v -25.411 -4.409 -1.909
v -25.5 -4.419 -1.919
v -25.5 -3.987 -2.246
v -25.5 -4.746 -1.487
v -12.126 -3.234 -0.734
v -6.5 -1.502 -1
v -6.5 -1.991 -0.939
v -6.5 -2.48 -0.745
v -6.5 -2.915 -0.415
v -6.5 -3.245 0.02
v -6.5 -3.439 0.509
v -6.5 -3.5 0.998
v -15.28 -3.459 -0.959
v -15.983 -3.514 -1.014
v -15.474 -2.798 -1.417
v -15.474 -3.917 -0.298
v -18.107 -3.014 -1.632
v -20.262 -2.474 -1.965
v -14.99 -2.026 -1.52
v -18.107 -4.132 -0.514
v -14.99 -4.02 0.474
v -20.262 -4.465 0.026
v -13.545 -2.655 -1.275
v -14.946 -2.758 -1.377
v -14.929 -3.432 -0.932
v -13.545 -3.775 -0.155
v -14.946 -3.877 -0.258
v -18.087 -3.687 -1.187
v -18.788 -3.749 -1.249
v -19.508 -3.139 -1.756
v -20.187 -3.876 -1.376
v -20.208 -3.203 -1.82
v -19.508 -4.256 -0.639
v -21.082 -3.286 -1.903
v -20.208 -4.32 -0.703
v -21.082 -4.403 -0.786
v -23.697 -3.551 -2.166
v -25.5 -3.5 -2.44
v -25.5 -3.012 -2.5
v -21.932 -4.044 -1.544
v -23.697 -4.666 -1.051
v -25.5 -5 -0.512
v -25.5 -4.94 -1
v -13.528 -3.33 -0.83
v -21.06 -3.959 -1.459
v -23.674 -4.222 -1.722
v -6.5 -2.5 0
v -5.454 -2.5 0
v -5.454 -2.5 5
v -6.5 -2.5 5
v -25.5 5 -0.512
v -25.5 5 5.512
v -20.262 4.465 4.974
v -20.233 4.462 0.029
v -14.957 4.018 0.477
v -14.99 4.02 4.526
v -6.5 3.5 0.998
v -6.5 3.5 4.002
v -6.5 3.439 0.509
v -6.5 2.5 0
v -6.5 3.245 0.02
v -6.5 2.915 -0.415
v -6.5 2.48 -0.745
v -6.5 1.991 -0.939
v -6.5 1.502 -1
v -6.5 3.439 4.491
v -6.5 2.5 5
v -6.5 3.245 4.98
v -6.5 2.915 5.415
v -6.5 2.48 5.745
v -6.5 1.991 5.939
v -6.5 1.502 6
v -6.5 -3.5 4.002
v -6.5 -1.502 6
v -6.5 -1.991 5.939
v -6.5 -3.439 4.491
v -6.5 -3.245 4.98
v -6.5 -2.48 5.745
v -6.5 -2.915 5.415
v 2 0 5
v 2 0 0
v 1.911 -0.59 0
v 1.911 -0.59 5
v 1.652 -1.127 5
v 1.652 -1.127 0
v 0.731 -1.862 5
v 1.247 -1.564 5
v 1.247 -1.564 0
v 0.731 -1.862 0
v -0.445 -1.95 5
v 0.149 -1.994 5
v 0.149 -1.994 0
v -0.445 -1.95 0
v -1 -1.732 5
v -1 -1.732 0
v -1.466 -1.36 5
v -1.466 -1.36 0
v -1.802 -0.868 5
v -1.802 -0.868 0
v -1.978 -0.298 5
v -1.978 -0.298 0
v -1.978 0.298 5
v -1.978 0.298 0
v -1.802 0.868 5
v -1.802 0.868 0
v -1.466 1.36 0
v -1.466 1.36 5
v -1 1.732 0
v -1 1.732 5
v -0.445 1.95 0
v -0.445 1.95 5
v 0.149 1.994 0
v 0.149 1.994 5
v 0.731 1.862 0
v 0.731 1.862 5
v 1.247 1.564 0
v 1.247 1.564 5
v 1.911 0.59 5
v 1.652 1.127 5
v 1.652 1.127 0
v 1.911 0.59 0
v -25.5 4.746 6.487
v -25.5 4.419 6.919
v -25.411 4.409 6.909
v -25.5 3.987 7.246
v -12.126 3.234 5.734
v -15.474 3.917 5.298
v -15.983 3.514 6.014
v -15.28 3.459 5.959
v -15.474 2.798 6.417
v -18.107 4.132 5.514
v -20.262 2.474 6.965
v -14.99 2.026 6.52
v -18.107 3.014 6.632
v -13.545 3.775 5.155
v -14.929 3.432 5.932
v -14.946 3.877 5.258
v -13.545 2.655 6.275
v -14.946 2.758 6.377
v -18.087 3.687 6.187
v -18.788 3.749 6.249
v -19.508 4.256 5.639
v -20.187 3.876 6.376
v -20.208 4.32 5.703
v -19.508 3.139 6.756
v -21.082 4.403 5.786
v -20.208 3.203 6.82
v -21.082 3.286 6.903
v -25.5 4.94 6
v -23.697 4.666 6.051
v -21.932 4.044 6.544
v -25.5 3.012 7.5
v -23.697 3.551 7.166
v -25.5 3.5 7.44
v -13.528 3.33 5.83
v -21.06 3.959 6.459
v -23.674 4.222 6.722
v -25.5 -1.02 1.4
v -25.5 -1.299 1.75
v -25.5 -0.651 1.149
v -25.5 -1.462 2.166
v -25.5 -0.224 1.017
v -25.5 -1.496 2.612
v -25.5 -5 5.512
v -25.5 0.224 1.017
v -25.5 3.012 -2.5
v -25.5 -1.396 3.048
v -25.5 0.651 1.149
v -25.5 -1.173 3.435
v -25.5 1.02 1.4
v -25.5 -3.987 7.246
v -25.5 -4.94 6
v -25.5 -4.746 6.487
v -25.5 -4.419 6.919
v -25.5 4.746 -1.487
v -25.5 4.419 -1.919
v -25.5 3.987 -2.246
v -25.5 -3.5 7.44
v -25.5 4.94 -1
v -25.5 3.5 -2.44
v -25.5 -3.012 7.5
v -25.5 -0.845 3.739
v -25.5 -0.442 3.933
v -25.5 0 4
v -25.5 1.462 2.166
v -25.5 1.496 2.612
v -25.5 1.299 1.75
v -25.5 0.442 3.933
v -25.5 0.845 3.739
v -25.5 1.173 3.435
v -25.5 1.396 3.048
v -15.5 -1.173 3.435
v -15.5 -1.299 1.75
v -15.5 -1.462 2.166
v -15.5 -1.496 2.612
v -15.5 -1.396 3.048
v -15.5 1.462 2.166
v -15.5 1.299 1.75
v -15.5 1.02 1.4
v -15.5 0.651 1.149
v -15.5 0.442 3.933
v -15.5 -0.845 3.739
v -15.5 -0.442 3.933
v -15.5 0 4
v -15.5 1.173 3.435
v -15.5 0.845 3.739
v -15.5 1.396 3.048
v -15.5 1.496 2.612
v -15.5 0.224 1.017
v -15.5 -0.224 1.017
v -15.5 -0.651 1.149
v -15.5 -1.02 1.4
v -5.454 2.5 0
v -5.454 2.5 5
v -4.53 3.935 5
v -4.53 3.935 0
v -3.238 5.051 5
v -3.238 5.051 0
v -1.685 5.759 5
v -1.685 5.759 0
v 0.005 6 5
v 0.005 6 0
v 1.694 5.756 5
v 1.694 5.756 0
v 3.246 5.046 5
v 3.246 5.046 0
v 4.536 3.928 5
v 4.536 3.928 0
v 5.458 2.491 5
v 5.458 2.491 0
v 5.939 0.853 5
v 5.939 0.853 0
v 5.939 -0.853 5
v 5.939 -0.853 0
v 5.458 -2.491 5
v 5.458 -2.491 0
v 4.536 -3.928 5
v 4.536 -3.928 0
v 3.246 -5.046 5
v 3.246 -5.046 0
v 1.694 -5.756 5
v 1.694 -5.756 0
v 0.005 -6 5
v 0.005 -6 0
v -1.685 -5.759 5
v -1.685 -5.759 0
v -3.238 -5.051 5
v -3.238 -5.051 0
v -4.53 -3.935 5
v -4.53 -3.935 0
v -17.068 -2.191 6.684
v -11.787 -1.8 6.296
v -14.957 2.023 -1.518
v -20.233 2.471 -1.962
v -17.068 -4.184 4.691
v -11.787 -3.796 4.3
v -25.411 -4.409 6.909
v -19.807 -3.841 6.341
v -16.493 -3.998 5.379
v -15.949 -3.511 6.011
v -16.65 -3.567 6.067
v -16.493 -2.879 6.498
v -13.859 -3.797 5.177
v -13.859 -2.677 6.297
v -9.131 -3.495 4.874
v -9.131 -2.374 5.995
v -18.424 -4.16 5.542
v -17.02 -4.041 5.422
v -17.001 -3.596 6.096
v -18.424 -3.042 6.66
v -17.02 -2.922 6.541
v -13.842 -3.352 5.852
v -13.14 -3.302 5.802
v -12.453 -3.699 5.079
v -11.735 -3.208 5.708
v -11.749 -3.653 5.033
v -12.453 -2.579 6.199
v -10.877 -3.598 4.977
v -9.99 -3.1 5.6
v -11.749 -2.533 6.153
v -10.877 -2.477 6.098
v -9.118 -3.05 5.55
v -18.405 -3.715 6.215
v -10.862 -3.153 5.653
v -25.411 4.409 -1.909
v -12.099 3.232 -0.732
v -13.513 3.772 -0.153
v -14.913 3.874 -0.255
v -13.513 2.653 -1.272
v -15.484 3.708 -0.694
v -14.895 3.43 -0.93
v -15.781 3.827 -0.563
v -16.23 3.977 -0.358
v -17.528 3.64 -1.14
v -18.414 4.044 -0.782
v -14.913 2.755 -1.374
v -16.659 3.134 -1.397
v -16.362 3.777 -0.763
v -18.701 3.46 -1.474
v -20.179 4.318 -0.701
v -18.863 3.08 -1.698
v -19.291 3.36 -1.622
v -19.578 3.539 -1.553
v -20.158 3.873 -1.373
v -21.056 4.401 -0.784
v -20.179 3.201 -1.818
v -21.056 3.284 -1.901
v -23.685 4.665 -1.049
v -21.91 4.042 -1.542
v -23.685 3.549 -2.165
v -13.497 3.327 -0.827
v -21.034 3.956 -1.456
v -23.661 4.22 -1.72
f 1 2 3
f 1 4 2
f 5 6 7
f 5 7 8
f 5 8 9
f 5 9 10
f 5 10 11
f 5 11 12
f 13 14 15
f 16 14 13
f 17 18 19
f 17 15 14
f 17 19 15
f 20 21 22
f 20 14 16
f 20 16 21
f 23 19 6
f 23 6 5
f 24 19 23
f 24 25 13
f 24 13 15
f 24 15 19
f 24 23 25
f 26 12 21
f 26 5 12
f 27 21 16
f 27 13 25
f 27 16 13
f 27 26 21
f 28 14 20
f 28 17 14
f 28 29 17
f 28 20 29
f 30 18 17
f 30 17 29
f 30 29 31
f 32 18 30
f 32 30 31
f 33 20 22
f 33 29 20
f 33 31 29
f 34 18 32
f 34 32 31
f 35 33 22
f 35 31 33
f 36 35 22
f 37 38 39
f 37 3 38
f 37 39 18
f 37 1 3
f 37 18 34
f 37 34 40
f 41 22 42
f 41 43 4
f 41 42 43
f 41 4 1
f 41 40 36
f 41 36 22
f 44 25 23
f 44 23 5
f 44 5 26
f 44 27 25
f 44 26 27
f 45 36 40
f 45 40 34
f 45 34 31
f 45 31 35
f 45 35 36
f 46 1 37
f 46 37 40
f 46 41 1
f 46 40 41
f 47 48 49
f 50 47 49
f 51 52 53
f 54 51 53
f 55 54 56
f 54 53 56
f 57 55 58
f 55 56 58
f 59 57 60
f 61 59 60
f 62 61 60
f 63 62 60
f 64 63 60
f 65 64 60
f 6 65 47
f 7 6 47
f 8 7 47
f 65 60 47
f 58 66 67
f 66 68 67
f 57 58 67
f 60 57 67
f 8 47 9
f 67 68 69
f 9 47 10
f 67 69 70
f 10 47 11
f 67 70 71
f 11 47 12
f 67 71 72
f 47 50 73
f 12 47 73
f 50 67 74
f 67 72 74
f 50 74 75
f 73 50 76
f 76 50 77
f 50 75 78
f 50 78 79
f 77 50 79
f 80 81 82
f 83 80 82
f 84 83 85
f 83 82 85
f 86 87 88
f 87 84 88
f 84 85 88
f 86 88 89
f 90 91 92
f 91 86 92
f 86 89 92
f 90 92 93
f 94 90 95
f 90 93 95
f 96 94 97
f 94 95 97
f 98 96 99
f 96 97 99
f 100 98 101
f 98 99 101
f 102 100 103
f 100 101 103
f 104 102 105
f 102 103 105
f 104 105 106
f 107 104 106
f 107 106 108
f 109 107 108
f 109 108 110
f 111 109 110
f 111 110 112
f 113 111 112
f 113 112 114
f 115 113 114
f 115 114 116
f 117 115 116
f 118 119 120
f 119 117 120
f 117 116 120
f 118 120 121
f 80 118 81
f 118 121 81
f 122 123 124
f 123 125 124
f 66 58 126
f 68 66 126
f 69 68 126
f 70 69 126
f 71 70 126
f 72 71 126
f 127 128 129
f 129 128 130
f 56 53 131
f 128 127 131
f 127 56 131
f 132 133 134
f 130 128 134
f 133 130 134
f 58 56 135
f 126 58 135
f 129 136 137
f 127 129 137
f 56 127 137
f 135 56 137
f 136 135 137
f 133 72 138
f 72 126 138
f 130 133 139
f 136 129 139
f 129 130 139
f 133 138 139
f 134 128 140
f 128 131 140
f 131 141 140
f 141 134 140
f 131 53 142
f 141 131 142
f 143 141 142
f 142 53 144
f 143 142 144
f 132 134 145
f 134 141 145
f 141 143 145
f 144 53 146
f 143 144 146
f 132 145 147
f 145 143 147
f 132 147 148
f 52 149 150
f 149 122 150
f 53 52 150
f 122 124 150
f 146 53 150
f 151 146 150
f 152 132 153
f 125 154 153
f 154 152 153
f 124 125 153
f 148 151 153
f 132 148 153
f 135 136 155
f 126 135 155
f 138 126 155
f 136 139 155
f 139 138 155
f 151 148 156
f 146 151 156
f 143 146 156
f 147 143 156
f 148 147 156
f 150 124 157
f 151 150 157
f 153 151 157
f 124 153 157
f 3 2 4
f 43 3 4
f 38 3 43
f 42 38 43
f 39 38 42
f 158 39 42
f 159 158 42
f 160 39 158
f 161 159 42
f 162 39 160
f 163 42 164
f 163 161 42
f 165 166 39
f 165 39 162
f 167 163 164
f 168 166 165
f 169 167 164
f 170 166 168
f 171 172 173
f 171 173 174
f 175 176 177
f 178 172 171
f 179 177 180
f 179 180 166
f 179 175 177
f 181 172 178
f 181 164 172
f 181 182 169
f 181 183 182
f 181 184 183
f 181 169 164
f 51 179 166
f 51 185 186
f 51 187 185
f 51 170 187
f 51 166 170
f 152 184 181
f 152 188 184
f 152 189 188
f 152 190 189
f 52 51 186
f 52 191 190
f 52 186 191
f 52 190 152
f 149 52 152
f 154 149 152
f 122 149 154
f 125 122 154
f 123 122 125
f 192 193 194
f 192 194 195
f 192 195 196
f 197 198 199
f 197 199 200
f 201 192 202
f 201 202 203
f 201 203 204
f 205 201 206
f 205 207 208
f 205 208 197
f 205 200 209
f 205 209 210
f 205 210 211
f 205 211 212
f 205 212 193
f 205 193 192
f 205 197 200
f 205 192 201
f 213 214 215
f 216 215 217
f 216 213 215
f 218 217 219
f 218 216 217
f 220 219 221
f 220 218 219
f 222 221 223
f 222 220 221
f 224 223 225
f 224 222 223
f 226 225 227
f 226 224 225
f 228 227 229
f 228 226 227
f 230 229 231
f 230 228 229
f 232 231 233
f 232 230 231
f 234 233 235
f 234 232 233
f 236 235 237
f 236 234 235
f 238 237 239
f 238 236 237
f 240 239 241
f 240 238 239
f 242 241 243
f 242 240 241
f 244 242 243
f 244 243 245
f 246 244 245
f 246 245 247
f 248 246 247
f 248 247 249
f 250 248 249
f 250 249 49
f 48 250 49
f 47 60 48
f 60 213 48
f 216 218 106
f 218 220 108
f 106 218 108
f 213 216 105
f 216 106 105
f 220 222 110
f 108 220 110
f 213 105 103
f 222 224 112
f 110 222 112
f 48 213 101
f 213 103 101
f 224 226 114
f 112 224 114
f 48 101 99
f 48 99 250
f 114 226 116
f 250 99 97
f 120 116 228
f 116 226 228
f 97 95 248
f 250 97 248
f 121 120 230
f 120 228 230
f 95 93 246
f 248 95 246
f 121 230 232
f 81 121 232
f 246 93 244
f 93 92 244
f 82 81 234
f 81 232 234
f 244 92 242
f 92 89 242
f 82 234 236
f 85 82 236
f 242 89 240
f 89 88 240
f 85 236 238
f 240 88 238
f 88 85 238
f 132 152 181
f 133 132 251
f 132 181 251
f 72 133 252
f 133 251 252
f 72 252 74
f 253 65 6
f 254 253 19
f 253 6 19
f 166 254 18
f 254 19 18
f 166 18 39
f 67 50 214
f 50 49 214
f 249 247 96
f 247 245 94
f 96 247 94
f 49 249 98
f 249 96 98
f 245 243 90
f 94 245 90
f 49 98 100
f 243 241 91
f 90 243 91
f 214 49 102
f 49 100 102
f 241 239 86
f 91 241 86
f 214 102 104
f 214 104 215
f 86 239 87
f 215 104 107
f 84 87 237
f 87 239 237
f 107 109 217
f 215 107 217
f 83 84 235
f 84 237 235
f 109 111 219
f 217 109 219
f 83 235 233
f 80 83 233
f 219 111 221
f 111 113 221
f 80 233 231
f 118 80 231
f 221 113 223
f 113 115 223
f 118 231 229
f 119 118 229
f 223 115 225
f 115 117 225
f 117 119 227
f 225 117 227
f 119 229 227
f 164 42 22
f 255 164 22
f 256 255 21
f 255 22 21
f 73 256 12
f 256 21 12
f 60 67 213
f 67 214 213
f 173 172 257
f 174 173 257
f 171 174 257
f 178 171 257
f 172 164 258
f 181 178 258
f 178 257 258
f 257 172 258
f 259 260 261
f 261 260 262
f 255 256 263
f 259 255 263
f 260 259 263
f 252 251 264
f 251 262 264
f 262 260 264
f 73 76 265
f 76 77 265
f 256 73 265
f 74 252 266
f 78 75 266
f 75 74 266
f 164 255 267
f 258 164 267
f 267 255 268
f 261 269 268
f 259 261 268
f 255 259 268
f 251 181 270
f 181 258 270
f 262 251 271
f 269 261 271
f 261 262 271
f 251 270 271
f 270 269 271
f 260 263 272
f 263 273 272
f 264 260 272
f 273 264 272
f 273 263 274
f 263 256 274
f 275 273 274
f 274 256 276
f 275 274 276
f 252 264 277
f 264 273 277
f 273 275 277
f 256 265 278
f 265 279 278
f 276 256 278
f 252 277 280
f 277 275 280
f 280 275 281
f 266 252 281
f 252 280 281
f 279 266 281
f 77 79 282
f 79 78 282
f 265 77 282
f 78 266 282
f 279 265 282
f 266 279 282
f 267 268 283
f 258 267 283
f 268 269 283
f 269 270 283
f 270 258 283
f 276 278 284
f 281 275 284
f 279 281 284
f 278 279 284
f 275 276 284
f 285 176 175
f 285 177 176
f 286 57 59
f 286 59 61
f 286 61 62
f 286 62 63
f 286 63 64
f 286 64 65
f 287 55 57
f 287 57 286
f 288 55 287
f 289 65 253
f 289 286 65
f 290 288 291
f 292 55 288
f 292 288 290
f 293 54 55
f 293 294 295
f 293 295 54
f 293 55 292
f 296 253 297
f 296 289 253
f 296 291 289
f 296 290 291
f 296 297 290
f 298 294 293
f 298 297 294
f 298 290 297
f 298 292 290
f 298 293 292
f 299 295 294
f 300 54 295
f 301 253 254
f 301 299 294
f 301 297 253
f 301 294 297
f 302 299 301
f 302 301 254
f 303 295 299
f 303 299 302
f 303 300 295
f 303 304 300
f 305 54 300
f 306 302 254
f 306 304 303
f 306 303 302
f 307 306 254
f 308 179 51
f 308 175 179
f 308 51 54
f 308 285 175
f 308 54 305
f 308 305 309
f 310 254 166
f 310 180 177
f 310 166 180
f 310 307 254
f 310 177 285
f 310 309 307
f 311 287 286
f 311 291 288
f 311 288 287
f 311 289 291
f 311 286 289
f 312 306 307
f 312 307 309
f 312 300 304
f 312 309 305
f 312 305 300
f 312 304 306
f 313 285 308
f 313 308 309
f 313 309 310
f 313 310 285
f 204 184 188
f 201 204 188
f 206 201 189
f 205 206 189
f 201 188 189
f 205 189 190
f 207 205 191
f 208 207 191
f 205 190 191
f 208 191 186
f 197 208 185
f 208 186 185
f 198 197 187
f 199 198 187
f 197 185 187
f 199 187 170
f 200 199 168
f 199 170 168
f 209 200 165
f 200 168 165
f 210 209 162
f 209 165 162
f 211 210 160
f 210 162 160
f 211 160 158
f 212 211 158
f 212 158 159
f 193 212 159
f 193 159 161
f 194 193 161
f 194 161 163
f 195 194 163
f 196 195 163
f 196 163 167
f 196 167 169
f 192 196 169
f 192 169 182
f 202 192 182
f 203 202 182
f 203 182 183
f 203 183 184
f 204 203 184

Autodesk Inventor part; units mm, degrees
ref_plane "XZ Plane" through (0, 0, 0) normal (0, 1, 0) x (-1, 0, 0)
ref_plane "XY Plane" through (0, 0, 0) normal (0, 0, 1) x (1, 0, 0)
sketch "Sketch1" plane through (0, 0, 0) normal (0, 0, 1) x (1, 0, 0)
  circle A0 centre (0, 0) radius 2
  circle A1 centre (0, 0) radius 6
  dimension "d0" = 4
  dimension "d1" = 12
extrude "Extrusion1" add sketch "Sketch1" along normal blind 5
ref_plane "Work Plane1" through (-2.5, 0, 0) normal (1, 0, 0) x (0, 1, 0)
sketch "Sketch5" plane through (-2.5, 0, 0) normal (1, 0, 0) x (0, 1, 0)
  line L0 (2.5, 0) -> (-2.5, 0)
  line L1 (-2.5, 0) -> (-2.5, 5)
  line L2 (-2.5, 5) -> (2.5, 5)
  line L3 (2.5, 5) -> (2.5, 0)
  point P0 (0, 0)
  point P1 (0, 0)
  dimension "d5" = 5
  dimension "d6" = 5
extrude "Extrusion2" add sketch "Sketch5" against normal blind 6
sketch "Sketch7" plane through (-8.5, 0, 0) normal (-1, 0, 0) x (0, 0, 1)
  line L0 (0, 2.5) -> (0, -2.5) projected
  line L1 (0, -2.5) -> (5, -2.5) projected
  line L2 (5, -2.5) -> (5, 2.5) projected
  line L3 (5, 2.5) -> (0, 2.5) projected
  point P0 (0, 0)
extrude "Extrusion3" add sketch "Sketch7" along normal blind 17
sketch "Sketch8" plane through (0, 0, 5) normal (0, 0, 1) x (1, 0, 0)
  line L0 (-25.5, 5) -> (-25.5, -5)
  line L1 (-25.5, -2.5) -> (-25.5, 2.5) projected
  line L2 (-6.5, 3.5) -> (-6.5, -3.5)
  arc A0 (-25.5, 5) -> (-6.5, 3.5) centre (7.5988, 303.1685) ccw
  arc A1 (-6.5, -3.5) -> (-25.5, -5) centre (7.5988, -303.1685) ccw
  point P0 (0, 0)
  point P1 (-25.5, 0)
  point P2 (-25.5, 0)
  point P3 (-6.5, 0)
  dimension "d11" = 10
  dimension "d12" = 7
  dimension "d13" = 6.5
  dimension "d14" = 300
  dimension "d15" = 300
extrude "Extrusion4" add sketch "Sketch8" against normal blind 6 and the other way blind 1
sketch "Sketch9" plane through (-5.4544, 2.5, 5) normal (0, 1, 0) x (1, 0, 0)
  line L0 (-20.0456, 7.5) -> (-20.0456, -2.5) construction
  line L1 (-20.0456, -1) -> (-20.0456, 6) projected
  line L2 (-1.0456, 6) -> (-1.0456, -1)
  arc A0 (-20.0456, 7.5) -> (-1.0456, 6) centre (13.0532, 305.6685) ccw
  arc A1 (-1.0456, -1) -> (-20.0456, -2.5) centre (13.0532, -300.6685) ccw
  line L3 (-1.0456, 6) -> (-1.0456, -1) projected
  line L4 (-20.0456, 6) -> (-1.0456, 6)
  line L5 (-20.0456, -1) -> (-1.0456, -1)
  line L6 (-20.0456, 6) -> (-20.0456, 7.5)
  line L7 (-20.0456, -2.5) -> (-20.0456, -1)
  point P0 (5.4544, 5)
  point P1 (-20.0456, 2.5)
  dimension "d20" = 10
  dimension "d21" = 300
  dimension "d22" = 300
extrude "Extrusion5" add sketch "Sketch9" along normal blind 2.5 and the other way blind 7.5 contours L5 A1 L7 | L6 A0 L4
sketch "Sketch10" plane through (-25.5, 5, -1) normal (0, 0, 1) x (1, 0, 0)
  arc A0 (0, 0) -> (19, -1.5) centre (33.0988, 298.1685) ccw projected
  line L0 (19, -1.5) -> (19, 0) projected
  line L1 (0, 0) -> (19, 0) projected
  arc A1 (19, -8.5) -> (0, -10) centre (33.0988, -308.1685) ccw projected
  line L2 (19, -10) -> (0, -10) projected
  line L3 (19, -10) -> (19, -8.5) projected
  point P0 (25.5, -5)
extrude "Extrusion6" cut sketch "Sketch10" along normal through all both and the other way through all
fillet "Fillet1" radius 2 4 edges at (-16.0467, 4.1018, 6.6018) (-16.0467, 4.1018, -1.6018) (-16.0467, -4.1018, 6.6018) (-16.0467, -4.1018, -1.6018)
sketch "Sketch11" plane through (-25.5, 0, 0) normal (-1, 0, 0) x (0, 0, 1)
  circle A0 centre (2.5, 0) radius 1.5
  line L0 (5.5122, 5) -> (-0.5122, 5) projected
  line L1 (7.5, 3.0122) -> (7.5, -3.0122) projected
  point P0 (0, 0)
  point P1 (7.5, 0)
  point P2 (2.5, 5)
  dimension "d30" = 3
extrude "Extrusion7" cut sketch "Sketch11" against normal blind 10
properties part number "Arm2" material "ABS Plastic"
